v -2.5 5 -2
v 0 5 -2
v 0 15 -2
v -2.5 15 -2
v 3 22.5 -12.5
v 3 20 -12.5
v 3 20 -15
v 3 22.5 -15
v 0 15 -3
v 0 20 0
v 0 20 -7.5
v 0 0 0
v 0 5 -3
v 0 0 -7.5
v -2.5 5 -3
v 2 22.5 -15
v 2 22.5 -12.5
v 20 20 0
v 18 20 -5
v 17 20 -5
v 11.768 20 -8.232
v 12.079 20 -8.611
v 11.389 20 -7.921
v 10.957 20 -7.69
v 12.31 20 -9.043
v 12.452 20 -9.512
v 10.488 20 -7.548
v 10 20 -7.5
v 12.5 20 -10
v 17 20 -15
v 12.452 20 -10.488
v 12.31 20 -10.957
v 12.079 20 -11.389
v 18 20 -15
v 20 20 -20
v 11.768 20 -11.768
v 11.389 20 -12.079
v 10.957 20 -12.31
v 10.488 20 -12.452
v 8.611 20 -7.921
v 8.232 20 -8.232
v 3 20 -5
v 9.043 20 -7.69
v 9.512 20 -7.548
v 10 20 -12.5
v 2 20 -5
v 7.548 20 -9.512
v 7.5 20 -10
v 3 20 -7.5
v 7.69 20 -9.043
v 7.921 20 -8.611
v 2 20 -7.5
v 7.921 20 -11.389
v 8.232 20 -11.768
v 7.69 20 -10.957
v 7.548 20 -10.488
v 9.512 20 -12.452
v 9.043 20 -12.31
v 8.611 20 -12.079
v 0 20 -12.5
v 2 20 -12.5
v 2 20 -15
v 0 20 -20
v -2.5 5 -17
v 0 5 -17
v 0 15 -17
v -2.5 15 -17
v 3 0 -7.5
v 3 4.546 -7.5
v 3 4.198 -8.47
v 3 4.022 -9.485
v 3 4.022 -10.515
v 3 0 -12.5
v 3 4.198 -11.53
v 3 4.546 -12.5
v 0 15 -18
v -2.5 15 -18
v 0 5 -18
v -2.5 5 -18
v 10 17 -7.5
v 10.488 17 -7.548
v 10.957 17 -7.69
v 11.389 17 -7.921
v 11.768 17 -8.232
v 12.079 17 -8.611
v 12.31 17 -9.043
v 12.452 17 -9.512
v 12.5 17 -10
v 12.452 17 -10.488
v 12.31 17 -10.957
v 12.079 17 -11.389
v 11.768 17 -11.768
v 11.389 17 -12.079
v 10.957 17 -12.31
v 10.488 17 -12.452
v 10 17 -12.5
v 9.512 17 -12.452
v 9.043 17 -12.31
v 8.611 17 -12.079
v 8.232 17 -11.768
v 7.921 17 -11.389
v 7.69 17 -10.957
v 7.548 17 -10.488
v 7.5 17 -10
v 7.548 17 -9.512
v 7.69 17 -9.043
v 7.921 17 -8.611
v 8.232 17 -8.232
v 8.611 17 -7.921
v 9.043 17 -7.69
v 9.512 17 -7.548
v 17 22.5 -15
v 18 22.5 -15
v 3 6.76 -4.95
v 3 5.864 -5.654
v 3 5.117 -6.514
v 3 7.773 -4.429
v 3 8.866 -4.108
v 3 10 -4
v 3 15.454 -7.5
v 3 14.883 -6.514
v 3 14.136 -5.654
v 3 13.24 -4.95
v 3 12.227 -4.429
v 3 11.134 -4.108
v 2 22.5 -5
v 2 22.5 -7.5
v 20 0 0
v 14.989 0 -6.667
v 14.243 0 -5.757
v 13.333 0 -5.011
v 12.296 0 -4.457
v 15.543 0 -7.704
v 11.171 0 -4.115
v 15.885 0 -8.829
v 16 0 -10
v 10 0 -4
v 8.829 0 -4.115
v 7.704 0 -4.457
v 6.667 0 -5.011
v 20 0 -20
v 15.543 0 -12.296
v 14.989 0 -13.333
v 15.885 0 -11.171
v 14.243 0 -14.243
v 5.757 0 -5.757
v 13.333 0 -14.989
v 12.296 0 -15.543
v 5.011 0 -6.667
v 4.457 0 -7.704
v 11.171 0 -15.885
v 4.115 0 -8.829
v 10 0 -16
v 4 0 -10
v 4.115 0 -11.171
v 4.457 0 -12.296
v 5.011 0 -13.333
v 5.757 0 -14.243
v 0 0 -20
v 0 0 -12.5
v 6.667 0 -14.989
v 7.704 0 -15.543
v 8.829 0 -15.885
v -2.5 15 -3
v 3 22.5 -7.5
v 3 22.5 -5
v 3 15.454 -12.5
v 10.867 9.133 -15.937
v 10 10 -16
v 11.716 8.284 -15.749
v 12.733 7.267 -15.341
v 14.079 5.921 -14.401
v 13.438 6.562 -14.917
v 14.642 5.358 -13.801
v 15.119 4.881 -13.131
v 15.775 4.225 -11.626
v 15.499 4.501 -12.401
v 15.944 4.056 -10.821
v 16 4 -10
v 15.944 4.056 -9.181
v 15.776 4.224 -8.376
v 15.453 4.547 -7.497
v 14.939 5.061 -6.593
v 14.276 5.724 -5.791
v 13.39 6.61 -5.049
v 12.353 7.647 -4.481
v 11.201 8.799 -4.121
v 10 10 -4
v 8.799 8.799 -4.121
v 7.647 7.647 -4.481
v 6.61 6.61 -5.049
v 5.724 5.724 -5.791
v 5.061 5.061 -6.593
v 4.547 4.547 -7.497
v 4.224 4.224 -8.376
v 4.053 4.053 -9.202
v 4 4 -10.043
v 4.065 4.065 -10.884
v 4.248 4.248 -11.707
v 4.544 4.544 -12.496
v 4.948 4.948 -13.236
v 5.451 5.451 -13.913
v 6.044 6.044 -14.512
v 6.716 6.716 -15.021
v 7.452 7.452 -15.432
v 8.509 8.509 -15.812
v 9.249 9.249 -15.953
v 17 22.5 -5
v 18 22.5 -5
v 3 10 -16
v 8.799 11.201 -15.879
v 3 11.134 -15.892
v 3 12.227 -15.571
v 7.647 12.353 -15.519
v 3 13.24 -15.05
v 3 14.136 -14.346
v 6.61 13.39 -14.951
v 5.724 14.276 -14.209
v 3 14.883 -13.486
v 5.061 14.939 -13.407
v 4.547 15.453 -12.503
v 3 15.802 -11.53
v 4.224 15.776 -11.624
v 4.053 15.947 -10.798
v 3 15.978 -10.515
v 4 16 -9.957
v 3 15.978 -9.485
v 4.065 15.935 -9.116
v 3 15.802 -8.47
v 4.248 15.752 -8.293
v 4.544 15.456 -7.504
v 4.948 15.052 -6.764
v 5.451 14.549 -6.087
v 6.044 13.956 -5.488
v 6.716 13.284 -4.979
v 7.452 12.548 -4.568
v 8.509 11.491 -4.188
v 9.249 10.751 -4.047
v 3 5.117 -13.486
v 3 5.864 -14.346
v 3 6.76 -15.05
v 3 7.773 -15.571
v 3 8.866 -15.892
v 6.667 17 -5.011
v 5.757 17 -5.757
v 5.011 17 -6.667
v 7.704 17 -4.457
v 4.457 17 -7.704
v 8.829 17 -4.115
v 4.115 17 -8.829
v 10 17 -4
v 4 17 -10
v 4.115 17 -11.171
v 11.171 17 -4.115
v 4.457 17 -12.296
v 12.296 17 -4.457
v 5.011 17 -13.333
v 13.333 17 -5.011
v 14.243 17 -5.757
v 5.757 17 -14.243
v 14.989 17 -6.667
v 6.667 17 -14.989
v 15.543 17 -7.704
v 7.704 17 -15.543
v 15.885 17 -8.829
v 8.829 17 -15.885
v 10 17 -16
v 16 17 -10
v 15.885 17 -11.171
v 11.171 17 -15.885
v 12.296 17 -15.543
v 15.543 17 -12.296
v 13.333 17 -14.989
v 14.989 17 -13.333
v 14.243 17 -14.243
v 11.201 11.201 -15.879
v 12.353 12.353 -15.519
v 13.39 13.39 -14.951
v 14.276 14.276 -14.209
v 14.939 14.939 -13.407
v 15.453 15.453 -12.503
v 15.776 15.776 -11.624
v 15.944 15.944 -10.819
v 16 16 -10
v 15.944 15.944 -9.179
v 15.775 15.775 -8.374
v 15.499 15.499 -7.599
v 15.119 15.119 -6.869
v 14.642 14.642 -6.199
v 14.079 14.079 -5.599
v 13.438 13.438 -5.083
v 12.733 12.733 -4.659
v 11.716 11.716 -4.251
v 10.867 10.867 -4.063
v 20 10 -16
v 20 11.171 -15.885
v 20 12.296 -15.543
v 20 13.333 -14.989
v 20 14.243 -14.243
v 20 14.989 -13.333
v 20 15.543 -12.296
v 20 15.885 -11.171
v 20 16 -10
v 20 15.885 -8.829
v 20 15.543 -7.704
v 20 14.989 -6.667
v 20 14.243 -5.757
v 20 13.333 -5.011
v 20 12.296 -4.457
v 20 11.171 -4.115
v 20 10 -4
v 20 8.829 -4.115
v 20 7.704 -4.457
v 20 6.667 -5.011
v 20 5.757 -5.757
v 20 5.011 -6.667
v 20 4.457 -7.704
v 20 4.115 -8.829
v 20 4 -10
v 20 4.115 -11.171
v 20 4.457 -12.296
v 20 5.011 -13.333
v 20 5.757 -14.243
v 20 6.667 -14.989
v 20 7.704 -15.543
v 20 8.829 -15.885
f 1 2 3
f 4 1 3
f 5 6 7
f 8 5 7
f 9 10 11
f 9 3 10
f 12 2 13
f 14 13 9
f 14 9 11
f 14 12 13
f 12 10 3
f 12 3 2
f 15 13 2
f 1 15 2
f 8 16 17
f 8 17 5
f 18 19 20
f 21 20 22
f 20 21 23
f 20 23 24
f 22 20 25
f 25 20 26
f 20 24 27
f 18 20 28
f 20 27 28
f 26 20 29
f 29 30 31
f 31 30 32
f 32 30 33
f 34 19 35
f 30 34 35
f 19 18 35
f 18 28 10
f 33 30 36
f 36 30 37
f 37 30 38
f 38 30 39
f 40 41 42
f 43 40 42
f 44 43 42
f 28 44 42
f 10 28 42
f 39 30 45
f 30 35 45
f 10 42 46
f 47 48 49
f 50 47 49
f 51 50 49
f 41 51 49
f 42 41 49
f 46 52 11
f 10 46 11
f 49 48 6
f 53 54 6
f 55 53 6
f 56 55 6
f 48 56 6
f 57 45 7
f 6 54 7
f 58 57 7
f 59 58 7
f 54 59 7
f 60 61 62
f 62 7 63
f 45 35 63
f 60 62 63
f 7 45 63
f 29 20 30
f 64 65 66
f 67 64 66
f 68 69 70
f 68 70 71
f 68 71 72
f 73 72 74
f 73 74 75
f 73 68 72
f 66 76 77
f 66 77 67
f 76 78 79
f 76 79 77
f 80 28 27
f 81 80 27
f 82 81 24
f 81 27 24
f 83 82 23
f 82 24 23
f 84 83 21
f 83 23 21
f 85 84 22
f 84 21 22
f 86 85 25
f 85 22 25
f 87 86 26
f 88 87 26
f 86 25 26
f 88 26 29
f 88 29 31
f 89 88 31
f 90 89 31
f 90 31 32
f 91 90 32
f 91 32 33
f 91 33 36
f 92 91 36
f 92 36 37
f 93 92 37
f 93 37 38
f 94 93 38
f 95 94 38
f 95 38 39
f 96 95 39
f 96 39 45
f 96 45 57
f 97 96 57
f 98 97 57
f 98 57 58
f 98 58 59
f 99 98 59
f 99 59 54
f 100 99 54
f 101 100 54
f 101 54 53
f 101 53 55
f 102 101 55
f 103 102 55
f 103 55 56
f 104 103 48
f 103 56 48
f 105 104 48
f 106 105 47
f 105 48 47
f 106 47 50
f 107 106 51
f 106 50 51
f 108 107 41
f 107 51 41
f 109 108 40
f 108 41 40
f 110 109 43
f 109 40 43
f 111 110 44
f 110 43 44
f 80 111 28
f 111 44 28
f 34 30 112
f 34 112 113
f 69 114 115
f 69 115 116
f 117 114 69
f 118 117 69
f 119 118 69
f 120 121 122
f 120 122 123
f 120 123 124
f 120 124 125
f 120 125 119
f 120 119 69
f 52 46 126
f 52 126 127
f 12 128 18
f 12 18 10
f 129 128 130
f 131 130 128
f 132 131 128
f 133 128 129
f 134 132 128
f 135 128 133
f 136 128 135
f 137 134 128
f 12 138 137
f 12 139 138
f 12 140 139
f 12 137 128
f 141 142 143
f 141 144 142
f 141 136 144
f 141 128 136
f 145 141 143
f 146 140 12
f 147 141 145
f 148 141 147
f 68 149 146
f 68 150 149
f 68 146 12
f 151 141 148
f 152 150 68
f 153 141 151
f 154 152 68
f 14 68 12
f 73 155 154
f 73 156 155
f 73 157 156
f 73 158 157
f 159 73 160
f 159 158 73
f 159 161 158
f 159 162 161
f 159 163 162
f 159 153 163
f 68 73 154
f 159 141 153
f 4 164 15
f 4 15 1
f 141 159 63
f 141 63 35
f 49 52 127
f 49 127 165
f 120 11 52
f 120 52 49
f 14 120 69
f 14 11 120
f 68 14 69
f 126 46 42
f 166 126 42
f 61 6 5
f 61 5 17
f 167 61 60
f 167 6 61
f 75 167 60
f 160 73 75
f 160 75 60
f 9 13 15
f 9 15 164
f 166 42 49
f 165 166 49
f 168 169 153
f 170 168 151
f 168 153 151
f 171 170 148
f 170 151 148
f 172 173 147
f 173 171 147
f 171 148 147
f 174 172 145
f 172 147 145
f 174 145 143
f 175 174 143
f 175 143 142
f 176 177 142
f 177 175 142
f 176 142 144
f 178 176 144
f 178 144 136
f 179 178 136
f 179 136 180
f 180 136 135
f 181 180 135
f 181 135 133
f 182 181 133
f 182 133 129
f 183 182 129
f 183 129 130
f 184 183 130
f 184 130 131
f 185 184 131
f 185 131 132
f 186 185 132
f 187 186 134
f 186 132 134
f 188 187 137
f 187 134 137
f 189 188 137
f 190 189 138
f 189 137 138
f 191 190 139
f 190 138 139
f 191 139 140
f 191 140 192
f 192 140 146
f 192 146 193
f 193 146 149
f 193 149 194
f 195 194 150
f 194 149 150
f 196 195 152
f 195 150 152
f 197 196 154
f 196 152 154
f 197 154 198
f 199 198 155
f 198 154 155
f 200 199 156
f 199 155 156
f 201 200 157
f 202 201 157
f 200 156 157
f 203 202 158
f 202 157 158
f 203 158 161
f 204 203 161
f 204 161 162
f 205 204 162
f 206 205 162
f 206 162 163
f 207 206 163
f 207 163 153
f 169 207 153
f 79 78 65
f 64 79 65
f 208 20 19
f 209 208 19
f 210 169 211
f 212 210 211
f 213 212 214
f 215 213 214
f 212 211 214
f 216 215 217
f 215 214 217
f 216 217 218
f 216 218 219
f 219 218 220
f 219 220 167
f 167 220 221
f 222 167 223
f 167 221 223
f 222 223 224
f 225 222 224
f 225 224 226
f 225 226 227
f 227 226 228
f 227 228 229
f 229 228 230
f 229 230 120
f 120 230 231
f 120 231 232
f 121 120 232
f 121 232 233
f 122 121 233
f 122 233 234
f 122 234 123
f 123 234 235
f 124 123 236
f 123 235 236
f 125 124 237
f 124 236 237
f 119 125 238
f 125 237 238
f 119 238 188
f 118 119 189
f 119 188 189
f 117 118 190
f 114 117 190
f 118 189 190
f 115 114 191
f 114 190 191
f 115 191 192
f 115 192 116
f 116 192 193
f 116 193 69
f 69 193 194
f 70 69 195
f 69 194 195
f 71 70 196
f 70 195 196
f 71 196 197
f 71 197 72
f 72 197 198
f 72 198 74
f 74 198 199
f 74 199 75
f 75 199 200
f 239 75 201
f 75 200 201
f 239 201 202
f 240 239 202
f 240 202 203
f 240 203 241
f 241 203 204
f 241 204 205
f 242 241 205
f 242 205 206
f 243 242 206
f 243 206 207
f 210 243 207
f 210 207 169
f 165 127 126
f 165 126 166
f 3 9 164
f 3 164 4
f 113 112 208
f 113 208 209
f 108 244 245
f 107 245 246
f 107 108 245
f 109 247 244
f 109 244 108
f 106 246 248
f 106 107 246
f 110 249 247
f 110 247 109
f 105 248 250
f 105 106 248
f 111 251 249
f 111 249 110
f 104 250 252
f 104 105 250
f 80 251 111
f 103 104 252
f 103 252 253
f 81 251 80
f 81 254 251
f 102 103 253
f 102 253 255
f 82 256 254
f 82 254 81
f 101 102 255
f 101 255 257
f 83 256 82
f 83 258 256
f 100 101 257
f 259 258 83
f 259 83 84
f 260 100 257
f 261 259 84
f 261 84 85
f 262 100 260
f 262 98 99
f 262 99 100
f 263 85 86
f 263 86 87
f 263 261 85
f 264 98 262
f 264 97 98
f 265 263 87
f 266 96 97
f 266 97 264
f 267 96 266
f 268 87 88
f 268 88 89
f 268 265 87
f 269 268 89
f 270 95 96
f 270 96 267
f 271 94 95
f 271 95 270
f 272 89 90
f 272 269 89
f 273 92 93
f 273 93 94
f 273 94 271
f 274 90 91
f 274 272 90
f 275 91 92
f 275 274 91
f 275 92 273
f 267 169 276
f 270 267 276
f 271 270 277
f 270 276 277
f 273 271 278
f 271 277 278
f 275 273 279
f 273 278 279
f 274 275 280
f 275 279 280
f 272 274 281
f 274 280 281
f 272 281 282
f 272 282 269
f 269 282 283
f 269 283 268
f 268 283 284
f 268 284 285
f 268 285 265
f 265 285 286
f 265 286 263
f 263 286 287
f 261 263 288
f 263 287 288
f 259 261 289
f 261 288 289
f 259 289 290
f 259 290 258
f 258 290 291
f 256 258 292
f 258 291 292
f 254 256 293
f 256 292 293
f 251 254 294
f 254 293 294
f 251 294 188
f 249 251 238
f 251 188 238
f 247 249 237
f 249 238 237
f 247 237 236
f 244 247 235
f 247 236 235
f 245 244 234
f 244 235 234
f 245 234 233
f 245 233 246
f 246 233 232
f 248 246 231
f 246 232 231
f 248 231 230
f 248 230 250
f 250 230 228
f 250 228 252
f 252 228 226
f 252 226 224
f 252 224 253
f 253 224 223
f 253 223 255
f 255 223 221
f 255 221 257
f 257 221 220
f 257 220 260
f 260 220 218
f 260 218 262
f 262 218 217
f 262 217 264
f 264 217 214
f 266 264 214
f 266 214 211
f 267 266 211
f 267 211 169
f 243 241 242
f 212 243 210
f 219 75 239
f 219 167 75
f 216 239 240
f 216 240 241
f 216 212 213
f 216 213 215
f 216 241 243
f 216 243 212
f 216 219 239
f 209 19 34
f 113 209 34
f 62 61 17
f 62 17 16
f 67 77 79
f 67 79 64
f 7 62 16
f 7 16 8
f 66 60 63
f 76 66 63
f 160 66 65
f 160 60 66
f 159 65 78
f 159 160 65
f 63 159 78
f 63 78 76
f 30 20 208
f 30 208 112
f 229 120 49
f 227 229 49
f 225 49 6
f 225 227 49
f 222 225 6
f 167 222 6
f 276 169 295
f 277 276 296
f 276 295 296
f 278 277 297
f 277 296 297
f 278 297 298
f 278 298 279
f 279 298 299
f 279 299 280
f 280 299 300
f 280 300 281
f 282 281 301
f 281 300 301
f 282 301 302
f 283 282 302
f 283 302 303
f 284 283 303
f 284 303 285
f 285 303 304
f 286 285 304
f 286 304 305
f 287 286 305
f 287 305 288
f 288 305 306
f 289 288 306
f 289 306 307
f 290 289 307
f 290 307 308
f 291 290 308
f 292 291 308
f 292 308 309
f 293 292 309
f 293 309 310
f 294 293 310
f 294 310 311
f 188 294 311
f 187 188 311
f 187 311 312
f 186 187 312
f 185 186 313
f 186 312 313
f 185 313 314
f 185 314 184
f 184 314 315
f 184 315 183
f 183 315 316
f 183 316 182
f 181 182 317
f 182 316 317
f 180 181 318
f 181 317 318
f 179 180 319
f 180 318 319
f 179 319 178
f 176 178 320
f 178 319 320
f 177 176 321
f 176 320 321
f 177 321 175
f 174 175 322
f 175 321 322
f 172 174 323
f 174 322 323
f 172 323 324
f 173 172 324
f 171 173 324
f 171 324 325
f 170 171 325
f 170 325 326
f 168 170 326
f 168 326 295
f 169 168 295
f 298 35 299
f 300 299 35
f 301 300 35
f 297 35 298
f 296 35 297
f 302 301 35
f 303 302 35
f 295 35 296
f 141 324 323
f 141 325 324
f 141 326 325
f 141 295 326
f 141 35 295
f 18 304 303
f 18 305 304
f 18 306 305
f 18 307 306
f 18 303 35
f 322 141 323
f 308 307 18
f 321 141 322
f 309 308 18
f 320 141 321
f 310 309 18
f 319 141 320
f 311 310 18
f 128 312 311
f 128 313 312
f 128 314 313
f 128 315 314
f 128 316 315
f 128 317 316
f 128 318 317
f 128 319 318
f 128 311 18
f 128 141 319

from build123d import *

# Parameters (mm, degrees)
BOSS_EXTRUDE1_DEPTH = 20
SKETCH2_W           = 1
SKETCH2_H           = 2.5
SKETCH2_H_2         = 10
BOSS_EXTRUDE2_DEPTH = 2.5
SKETCH2_3_R         = 2.5
CUT_EXTRUDE1_DEPTH  = 35.641016151
SKETCH3_W           = 1
SKETCH3_H           = 10
BOSS_EXTRUDE3_DEPTH = 2.5
SKETCH5_R           = 6
CUT_EXTRUDE3_DEPTH  = 17
SKETCH7_R           = 6
CUT_EXTRUDE5_DEPTH  = 17


with BuildPart() as part:
    # Sketch1 → Boss-Extrude1 (new body)
    with BuildSketch(Plane(origin=(0, 0, 0), x_dir=(1, 0, 0), z_dir=(0, 1, 0))):
        Polygon((0, 7.5), (3, 7.5), (3, 12.5), (0, 12.5), (0, 20), (20, 20), (20, 0), (0, 0), align=None)
    extrude(amount=BOSS_EXTRUDE1_DEPTH)

    # Sketch2 → Boss-Extrude2 (add)
    with BuildSketch(Plane(origin=(0, 20, 0), x_dir=(1, 0, 0), z_dir=(0, 1, 0))):
        with Locations((2.5, 6.25)):
            Rectangle(SKETCH2_W, SKETCH2_H)
        with Locations((2.5, 13.75)):
            Rectangle(SKETCH2_W, SKETCH2_H)
        with Locations((17.5, 10)):
            Rectangle(SKETCH2_W, SKETCH2_H_2)
    extrude(amount=BOSS_EXTRUDE2_DEPTH)

    # Sketch2<3> → Cut-Extrude1 (cut, through all)
    with BuildSketch(Plane(origin=(0, 20, 0), x_dir=(1, 0, 0), z_dir=(0, 1, 0))):
        with Locations(Location((10, 10, 0), (0, 0, 270))):
            Circle(SKETCH2_3_R)
    extrude(amount=-CUT_EXTRUDE1_DEPTH, mode=Mode.SUBTRACT)

    # Sketch3 → Boss-Extrude3 (add)
    with BuildSketch(Plane.ZY):
        with Locations((-2.5, 10)):
            Rectangle(SKETCH3_W, SKETCH3_H)
        with Locations((-17.5, 10)):
            Rectangle(SKETCH3_W, SKETCH3_H)
    extrude(amount=BOSS_EXTRUDE3_DEPTH)

    # Sketch5 → Cut-Extrude3 (cut)
    with BuildSketch(Plane(origin=(20, 0, 0), x_dir=(0, 0, -1), z_dir=(1, 0, 0))):
        with Locations((10, 10)):
            Circle(SKETCH5_R)
    extrude(amount=-CUT_EXTRUDE3_DEPTH, mode=Mode.SUBTRACT)

    # Sketch7 → Cut-Extrude5 (cut)
    with BuildSketch(Plane.XZ):
        with Locations(Location((10, -10, 0), (0, 0, 270))):
            Circle(SKETCH7_R)
    extrude(amount=-CUT_EXTRUDE5_DEPTH, mode=Mode.SUBTRACT)


solid = part.part
